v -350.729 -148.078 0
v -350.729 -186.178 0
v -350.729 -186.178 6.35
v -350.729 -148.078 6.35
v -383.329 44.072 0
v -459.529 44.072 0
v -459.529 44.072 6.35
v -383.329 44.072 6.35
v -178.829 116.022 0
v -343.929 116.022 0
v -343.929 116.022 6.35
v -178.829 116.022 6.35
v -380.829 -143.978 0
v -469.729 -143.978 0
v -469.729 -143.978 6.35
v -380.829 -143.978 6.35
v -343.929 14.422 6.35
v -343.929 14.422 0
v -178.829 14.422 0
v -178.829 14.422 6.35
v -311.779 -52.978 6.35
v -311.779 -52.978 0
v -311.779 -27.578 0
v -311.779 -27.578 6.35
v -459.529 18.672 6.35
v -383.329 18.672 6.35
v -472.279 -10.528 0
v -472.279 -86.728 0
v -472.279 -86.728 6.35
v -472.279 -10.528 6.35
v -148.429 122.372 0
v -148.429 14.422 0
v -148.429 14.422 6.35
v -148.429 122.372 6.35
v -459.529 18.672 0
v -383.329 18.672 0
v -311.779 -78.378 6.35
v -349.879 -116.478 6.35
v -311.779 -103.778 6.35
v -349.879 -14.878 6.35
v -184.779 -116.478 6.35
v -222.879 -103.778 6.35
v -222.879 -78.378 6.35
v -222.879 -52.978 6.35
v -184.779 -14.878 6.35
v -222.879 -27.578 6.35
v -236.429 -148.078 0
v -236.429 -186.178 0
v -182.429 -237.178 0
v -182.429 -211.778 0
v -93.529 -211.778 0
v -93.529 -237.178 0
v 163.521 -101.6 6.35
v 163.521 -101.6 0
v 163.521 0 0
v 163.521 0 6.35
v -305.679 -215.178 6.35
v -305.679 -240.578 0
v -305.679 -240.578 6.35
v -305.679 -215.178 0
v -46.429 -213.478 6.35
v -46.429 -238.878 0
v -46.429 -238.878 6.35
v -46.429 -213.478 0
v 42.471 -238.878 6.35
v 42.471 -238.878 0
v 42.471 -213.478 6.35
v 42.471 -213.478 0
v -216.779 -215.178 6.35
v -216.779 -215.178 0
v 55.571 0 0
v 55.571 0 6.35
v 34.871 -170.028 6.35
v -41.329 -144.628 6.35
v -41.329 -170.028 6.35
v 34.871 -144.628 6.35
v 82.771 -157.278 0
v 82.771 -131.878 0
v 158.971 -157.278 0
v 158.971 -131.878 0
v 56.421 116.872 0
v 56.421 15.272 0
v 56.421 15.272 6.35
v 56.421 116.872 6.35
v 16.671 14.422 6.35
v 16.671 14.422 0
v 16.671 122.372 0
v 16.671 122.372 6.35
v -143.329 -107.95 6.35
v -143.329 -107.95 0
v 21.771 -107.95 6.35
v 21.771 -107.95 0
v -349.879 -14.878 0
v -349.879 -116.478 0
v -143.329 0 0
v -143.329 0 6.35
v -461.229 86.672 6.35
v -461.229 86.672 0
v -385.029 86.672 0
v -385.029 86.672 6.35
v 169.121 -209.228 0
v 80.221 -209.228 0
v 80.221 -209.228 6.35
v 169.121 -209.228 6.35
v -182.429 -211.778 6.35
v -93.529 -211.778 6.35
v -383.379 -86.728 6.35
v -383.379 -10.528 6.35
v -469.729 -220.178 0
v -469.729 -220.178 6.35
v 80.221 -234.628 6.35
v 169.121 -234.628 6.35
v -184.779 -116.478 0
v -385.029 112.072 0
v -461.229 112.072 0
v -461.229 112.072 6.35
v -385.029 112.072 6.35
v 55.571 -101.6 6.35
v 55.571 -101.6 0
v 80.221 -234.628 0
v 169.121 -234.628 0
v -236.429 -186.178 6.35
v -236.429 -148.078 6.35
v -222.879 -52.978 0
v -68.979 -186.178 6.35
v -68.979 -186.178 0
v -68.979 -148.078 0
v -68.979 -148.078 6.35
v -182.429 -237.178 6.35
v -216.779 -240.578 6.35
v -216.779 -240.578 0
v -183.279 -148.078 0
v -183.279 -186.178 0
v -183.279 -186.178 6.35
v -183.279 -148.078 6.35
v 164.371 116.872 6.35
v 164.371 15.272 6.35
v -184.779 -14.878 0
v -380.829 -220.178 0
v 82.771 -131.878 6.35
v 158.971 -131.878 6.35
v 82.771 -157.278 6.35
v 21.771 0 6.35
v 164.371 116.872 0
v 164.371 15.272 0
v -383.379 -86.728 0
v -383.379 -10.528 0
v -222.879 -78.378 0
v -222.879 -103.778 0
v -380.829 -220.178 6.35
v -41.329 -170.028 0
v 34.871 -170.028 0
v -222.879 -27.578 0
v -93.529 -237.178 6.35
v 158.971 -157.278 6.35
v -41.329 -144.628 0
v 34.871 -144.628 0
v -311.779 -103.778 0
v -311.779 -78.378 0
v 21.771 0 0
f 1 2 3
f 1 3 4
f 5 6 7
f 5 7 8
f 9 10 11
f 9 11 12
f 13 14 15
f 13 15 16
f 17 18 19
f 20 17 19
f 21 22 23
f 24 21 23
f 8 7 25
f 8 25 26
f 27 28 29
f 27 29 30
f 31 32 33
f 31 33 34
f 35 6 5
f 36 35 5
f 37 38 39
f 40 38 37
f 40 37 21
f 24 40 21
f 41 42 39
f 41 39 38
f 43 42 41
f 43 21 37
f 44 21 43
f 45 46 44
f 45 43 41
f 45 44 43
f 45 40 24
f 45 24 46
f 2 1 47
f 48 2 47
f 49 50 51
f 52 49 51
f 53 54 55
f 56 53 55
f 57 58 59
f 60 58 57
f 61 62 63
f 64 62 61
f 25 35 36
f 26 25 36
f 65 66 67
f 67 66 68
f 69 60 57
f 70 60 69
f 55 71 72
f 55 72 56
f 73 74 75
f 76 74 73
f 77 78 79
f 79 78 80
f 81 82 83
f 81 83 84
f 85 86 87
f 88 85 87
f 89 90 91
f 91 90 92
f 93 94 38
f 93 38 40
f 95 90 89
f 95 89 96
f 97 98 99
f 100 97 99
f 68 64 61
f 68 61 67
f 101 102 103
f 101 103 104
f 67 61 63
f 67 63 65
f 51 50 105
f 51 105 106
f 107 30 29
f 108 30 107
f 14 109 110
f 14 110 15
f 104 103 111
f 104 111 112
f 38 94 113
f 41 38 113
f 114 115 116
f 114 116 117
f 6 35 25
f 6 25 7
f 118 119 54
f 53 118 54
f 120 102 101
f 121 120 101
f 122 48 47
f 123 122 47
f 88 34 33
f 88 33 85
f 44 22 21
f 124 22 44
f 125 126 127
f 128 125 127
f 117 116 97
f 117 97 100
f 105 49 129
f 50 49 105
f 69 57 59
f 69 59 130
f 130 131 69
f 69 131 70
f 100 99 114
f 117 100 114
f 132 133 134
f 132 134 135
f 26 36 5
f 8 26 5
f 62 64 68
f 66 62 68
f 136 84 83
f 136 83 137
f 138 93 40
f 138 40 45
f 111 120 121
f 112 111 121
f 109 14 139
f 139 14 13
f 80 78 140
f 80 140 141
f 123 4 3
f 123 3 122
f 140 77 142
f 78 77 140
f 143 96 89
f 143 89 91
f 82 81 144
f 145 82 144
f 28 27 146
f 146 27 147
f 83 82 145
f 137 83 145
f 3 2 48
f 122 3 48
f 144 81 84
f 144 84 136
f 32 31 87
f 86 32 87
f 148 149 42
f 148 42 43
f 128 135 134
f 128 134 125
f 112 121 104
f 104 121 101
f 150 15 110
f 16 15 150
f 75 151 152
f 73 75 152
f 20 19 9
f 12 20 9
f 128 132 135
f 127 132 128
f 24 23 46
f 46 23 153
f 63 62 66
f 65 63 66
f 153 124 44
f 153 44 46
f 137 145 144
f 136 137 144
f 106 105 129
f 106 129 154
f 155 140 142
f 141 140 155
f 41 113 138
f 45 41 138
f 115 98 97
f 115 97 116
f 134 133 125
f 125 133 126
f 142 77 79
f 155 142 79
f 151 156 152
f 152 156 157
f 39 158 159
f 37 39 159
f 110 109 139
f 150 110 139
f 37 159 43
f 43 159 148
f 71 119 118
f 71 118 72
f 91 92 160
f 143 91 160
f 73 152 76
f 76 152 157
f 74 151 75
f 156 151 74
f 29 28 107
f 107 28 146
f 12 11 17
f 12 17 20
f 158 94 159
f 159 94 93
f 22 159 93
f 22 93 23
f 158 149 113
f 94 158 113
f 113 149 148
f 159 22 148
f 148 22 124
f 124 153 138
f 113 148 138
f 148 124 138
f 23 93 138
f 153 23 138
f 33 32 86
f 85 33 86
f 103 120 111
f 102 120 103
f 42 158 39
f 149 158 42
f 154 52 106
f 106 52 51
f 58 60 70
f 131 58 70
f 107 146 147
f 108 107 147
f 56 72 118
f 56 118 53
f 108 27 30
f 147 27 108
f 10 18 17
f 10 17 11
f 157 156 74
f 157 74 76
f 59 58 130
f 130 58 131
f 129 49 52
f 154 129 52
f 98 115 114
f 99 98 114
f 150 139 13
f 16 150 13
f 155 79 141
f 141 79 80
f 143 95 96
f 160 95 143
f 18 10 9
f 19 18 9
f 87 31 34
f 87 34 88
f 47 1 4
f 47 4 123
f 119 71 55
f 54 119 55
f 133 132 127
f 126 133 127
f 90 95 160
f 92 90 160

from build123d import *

# Parameters (mm, degrees)
F1_W     = 76.2
F1_H     = 25.4
F2_DEPTH = 6.35
F1_W_2   = 88.9
F1_H_2   = 76.2
F1_W_3   = 165.1
F1_H_3   = 101.6
F1_W_4   = 114.3
F1_H_4   = 38.1
F1_W_5   = 107.95
F1_H_5   = 107.95


# Not quite as in the source:
# - a variable given as a bare number and used for a length is read in inches; the dataset says mm whatever the document's units were


with BuildPart() as f2:
    # F1 (on Top) → F2 (new body)
    with BuildSketch(Plane.XY):
        with Locations((-423.1286319411, 99.3716068767)):
            Rectangle(F1_W, F1_H)
    extrude(amount=F2_DEPTH)


with BuildPart() as f2b:
    # F1 (on Top) → F2, piece 2 (new body)
    with BuildSketch(Plane.XY):
        with Locations((-421.4286606973, 31.3716022751)):
            Rectangle(F1_W, F1_H)
    extrude(amount=F2_DEPTH)


with BuildPart() as f2c:
    # F1 (on Top) → F2, piece 3 (new body)
    with BuildSketch(Plane.XY):
        with Locations((-427.8286524599, -48.6284039599)):
            Rectangle(F1_W_2, F1_H_2)
    extrude(amount=F2_DEPTH)


with BuildPart() as f2d:
    # F1 (on Top) → F2, piece 4 (new body)
    with BuildSketch(Plane.XY):
        with Locations((-425.2786477248, -182.0783964606)):
            Rectangle(F1_W_2, F1_H_2)
    extrude(amount=F2_DEPTH)


with BuildPart() as f2e:
    # F1 (on Top) → F2, piece 5 (new body)
    with BuildSketch(Plane.XY):
        with Locations((-261.3786375164, 65.2216013642)):
            Rectangle(F1_W_3, F1_H_3)
    extrude(amount=F2_DEPTH)


with BuildPart() as f2f:
    # F1 (on Top) → F2, piece 6 (new body)
    with BuildSketch(Plane.XY):
        with Locations((-267.328648565, -65.6784033552)):
            Rectangle(F1_W_3, F1_H_3)
        with Locations((-267.328648565, -91.0784033552)):
            Rectangle(F1_W_2, F1_H, mode=Mode.SUBTRACT)
        with Locations((-267.328648565, -40.2784033552)):
            Rectangle(F1_W_2, F1_H, mode=Mode.SUBTRACT)
    extrude(amount=F2_DEPTH)


with BuildPart() as f2g:
    # F1 (on Top) → F2, piece 7 (new body)
    with BuildSketch(Plane.XY):
        with Locations((-293.5786501434, -167.1283971517)):
            Rectangle(F1_W_4, F1_H_4)
    extrude(amount=F2_DEPTH)


with BuildPart() as f2h:
    # F1 (on Top) → F2, piece 8 (new body)
    with BuildSketch(Plane.XY):
        with Locations((-261.2286622286, -227.8784024286)):
            Rectangle(F1_W_2, F1_H)
    extrude(amount=F2_DEPTH)


with BuildPart() as f2i:
    # F1 (on Top) → F2, piece 9 (new body)
    with BuildSketch(Plane.XY):
        with Locations((-126.1286423772, -167.1283971517)):
            Rectangle(F1_W_4, F1_H_4)
    extrude(amount=F2_DEPTH)


with BuildPart() as f2j:
    # F1 (on Top) → F2, piece 10 (new body)
    with BuildSketch(Plane.XY):
        with Locations((-137.9786567553, -224.4784120716)):
            Rectangle(F1_W_2, F1_H)
    extrude(amount=F2_DEPTH)


with BuildPart() as f2k:
    # F1 (on Top) → F2, piece 11 (new body)
    with BuildSketch(Plane.XY):
        with Locations((-3.2286500492, -157.3283990755)):
            Rectangle(F1_W, F1_H)
    extrude(amount=F2_DEPTH)


with BuildPart() as f2l:
    # F1 (on Top) → F2, piece 12 (new body)
    with BuildSketch(Plane.XY):
        with Locations((-1.9786435629, -226.1784152283)):
            Rectangle(F1_W_2, F1_H)
    extrude(amount=F2_DEPTH)


with BuildPart() as f2m:
    # F1 (on Top) → F2, piece 13 (new body)
    with BuildSketch(Plane.XY):
        with Locations((124.6713682238, -221.9284073365)):
            Rectangle(F1_W_2, F1_H)
    extrude(amount=F2_DEPTH)


with BuildPart() as f2n:
    # F1 (on Top) → F2, piece 14 (new body)
    with BuildSketch(Plane.XY):
        with Locations((120.8713649807, -144.5784073129)):
            Rectangle(F1_W, F1_H)
    extrude(amount=F2_DEPTH)


with BuildPart() as f2o:
    # F1 (on Top) → F2, piece 15 (new body)
    with BuildSketch(Plane.XY):
        with Locations((109.5463703205, -50.8)):
            Rectangle(F1_W_5, F1_H_3)
    extrude(amount=F2_DEPTH)


with BuildPart() as f2p:
    # F1 (on Top) → F2, piece 16 (new body)
    with BuildSketch(Plane.XY):
        with Locations((110.396343975, 66.0715989535)):
            Rectangle(F1_W_5, F1_H_3)
    extrude(amount=F2_DEPTH)


with BuildPart() as f2q:
    # F1 (on Top) → F2, piece 17 (new body)
    with BuildSketch(Plane.XY):
        with Locations((-65.8786574463, 68.3966013642)):
            Rectangle(F1_W_3, F1_H_5)
    extrude(amount=F2_DEPTH)


with BuildPart() as f2r:
    # F1 (on Top) → F2, piece 18 (new body)
    with BuildSketch(Plane.XY):
        with Locations((-60.7786479761, -53.975)):
            Rectangle(F1_W_3, F1_H_5)
    extrude(amount=F2_DEPTH)


solid = Compound([f2.part, f2b.part, f2c.part, f2d.part, f2e.part, f2f.part, f2g.part, f2h.part, f2i.part, f2j.part, f2k.part, f2l.part, f2m.part, f2n.part, f2o.part, f2p.part, f2q.part, f2r.part])
